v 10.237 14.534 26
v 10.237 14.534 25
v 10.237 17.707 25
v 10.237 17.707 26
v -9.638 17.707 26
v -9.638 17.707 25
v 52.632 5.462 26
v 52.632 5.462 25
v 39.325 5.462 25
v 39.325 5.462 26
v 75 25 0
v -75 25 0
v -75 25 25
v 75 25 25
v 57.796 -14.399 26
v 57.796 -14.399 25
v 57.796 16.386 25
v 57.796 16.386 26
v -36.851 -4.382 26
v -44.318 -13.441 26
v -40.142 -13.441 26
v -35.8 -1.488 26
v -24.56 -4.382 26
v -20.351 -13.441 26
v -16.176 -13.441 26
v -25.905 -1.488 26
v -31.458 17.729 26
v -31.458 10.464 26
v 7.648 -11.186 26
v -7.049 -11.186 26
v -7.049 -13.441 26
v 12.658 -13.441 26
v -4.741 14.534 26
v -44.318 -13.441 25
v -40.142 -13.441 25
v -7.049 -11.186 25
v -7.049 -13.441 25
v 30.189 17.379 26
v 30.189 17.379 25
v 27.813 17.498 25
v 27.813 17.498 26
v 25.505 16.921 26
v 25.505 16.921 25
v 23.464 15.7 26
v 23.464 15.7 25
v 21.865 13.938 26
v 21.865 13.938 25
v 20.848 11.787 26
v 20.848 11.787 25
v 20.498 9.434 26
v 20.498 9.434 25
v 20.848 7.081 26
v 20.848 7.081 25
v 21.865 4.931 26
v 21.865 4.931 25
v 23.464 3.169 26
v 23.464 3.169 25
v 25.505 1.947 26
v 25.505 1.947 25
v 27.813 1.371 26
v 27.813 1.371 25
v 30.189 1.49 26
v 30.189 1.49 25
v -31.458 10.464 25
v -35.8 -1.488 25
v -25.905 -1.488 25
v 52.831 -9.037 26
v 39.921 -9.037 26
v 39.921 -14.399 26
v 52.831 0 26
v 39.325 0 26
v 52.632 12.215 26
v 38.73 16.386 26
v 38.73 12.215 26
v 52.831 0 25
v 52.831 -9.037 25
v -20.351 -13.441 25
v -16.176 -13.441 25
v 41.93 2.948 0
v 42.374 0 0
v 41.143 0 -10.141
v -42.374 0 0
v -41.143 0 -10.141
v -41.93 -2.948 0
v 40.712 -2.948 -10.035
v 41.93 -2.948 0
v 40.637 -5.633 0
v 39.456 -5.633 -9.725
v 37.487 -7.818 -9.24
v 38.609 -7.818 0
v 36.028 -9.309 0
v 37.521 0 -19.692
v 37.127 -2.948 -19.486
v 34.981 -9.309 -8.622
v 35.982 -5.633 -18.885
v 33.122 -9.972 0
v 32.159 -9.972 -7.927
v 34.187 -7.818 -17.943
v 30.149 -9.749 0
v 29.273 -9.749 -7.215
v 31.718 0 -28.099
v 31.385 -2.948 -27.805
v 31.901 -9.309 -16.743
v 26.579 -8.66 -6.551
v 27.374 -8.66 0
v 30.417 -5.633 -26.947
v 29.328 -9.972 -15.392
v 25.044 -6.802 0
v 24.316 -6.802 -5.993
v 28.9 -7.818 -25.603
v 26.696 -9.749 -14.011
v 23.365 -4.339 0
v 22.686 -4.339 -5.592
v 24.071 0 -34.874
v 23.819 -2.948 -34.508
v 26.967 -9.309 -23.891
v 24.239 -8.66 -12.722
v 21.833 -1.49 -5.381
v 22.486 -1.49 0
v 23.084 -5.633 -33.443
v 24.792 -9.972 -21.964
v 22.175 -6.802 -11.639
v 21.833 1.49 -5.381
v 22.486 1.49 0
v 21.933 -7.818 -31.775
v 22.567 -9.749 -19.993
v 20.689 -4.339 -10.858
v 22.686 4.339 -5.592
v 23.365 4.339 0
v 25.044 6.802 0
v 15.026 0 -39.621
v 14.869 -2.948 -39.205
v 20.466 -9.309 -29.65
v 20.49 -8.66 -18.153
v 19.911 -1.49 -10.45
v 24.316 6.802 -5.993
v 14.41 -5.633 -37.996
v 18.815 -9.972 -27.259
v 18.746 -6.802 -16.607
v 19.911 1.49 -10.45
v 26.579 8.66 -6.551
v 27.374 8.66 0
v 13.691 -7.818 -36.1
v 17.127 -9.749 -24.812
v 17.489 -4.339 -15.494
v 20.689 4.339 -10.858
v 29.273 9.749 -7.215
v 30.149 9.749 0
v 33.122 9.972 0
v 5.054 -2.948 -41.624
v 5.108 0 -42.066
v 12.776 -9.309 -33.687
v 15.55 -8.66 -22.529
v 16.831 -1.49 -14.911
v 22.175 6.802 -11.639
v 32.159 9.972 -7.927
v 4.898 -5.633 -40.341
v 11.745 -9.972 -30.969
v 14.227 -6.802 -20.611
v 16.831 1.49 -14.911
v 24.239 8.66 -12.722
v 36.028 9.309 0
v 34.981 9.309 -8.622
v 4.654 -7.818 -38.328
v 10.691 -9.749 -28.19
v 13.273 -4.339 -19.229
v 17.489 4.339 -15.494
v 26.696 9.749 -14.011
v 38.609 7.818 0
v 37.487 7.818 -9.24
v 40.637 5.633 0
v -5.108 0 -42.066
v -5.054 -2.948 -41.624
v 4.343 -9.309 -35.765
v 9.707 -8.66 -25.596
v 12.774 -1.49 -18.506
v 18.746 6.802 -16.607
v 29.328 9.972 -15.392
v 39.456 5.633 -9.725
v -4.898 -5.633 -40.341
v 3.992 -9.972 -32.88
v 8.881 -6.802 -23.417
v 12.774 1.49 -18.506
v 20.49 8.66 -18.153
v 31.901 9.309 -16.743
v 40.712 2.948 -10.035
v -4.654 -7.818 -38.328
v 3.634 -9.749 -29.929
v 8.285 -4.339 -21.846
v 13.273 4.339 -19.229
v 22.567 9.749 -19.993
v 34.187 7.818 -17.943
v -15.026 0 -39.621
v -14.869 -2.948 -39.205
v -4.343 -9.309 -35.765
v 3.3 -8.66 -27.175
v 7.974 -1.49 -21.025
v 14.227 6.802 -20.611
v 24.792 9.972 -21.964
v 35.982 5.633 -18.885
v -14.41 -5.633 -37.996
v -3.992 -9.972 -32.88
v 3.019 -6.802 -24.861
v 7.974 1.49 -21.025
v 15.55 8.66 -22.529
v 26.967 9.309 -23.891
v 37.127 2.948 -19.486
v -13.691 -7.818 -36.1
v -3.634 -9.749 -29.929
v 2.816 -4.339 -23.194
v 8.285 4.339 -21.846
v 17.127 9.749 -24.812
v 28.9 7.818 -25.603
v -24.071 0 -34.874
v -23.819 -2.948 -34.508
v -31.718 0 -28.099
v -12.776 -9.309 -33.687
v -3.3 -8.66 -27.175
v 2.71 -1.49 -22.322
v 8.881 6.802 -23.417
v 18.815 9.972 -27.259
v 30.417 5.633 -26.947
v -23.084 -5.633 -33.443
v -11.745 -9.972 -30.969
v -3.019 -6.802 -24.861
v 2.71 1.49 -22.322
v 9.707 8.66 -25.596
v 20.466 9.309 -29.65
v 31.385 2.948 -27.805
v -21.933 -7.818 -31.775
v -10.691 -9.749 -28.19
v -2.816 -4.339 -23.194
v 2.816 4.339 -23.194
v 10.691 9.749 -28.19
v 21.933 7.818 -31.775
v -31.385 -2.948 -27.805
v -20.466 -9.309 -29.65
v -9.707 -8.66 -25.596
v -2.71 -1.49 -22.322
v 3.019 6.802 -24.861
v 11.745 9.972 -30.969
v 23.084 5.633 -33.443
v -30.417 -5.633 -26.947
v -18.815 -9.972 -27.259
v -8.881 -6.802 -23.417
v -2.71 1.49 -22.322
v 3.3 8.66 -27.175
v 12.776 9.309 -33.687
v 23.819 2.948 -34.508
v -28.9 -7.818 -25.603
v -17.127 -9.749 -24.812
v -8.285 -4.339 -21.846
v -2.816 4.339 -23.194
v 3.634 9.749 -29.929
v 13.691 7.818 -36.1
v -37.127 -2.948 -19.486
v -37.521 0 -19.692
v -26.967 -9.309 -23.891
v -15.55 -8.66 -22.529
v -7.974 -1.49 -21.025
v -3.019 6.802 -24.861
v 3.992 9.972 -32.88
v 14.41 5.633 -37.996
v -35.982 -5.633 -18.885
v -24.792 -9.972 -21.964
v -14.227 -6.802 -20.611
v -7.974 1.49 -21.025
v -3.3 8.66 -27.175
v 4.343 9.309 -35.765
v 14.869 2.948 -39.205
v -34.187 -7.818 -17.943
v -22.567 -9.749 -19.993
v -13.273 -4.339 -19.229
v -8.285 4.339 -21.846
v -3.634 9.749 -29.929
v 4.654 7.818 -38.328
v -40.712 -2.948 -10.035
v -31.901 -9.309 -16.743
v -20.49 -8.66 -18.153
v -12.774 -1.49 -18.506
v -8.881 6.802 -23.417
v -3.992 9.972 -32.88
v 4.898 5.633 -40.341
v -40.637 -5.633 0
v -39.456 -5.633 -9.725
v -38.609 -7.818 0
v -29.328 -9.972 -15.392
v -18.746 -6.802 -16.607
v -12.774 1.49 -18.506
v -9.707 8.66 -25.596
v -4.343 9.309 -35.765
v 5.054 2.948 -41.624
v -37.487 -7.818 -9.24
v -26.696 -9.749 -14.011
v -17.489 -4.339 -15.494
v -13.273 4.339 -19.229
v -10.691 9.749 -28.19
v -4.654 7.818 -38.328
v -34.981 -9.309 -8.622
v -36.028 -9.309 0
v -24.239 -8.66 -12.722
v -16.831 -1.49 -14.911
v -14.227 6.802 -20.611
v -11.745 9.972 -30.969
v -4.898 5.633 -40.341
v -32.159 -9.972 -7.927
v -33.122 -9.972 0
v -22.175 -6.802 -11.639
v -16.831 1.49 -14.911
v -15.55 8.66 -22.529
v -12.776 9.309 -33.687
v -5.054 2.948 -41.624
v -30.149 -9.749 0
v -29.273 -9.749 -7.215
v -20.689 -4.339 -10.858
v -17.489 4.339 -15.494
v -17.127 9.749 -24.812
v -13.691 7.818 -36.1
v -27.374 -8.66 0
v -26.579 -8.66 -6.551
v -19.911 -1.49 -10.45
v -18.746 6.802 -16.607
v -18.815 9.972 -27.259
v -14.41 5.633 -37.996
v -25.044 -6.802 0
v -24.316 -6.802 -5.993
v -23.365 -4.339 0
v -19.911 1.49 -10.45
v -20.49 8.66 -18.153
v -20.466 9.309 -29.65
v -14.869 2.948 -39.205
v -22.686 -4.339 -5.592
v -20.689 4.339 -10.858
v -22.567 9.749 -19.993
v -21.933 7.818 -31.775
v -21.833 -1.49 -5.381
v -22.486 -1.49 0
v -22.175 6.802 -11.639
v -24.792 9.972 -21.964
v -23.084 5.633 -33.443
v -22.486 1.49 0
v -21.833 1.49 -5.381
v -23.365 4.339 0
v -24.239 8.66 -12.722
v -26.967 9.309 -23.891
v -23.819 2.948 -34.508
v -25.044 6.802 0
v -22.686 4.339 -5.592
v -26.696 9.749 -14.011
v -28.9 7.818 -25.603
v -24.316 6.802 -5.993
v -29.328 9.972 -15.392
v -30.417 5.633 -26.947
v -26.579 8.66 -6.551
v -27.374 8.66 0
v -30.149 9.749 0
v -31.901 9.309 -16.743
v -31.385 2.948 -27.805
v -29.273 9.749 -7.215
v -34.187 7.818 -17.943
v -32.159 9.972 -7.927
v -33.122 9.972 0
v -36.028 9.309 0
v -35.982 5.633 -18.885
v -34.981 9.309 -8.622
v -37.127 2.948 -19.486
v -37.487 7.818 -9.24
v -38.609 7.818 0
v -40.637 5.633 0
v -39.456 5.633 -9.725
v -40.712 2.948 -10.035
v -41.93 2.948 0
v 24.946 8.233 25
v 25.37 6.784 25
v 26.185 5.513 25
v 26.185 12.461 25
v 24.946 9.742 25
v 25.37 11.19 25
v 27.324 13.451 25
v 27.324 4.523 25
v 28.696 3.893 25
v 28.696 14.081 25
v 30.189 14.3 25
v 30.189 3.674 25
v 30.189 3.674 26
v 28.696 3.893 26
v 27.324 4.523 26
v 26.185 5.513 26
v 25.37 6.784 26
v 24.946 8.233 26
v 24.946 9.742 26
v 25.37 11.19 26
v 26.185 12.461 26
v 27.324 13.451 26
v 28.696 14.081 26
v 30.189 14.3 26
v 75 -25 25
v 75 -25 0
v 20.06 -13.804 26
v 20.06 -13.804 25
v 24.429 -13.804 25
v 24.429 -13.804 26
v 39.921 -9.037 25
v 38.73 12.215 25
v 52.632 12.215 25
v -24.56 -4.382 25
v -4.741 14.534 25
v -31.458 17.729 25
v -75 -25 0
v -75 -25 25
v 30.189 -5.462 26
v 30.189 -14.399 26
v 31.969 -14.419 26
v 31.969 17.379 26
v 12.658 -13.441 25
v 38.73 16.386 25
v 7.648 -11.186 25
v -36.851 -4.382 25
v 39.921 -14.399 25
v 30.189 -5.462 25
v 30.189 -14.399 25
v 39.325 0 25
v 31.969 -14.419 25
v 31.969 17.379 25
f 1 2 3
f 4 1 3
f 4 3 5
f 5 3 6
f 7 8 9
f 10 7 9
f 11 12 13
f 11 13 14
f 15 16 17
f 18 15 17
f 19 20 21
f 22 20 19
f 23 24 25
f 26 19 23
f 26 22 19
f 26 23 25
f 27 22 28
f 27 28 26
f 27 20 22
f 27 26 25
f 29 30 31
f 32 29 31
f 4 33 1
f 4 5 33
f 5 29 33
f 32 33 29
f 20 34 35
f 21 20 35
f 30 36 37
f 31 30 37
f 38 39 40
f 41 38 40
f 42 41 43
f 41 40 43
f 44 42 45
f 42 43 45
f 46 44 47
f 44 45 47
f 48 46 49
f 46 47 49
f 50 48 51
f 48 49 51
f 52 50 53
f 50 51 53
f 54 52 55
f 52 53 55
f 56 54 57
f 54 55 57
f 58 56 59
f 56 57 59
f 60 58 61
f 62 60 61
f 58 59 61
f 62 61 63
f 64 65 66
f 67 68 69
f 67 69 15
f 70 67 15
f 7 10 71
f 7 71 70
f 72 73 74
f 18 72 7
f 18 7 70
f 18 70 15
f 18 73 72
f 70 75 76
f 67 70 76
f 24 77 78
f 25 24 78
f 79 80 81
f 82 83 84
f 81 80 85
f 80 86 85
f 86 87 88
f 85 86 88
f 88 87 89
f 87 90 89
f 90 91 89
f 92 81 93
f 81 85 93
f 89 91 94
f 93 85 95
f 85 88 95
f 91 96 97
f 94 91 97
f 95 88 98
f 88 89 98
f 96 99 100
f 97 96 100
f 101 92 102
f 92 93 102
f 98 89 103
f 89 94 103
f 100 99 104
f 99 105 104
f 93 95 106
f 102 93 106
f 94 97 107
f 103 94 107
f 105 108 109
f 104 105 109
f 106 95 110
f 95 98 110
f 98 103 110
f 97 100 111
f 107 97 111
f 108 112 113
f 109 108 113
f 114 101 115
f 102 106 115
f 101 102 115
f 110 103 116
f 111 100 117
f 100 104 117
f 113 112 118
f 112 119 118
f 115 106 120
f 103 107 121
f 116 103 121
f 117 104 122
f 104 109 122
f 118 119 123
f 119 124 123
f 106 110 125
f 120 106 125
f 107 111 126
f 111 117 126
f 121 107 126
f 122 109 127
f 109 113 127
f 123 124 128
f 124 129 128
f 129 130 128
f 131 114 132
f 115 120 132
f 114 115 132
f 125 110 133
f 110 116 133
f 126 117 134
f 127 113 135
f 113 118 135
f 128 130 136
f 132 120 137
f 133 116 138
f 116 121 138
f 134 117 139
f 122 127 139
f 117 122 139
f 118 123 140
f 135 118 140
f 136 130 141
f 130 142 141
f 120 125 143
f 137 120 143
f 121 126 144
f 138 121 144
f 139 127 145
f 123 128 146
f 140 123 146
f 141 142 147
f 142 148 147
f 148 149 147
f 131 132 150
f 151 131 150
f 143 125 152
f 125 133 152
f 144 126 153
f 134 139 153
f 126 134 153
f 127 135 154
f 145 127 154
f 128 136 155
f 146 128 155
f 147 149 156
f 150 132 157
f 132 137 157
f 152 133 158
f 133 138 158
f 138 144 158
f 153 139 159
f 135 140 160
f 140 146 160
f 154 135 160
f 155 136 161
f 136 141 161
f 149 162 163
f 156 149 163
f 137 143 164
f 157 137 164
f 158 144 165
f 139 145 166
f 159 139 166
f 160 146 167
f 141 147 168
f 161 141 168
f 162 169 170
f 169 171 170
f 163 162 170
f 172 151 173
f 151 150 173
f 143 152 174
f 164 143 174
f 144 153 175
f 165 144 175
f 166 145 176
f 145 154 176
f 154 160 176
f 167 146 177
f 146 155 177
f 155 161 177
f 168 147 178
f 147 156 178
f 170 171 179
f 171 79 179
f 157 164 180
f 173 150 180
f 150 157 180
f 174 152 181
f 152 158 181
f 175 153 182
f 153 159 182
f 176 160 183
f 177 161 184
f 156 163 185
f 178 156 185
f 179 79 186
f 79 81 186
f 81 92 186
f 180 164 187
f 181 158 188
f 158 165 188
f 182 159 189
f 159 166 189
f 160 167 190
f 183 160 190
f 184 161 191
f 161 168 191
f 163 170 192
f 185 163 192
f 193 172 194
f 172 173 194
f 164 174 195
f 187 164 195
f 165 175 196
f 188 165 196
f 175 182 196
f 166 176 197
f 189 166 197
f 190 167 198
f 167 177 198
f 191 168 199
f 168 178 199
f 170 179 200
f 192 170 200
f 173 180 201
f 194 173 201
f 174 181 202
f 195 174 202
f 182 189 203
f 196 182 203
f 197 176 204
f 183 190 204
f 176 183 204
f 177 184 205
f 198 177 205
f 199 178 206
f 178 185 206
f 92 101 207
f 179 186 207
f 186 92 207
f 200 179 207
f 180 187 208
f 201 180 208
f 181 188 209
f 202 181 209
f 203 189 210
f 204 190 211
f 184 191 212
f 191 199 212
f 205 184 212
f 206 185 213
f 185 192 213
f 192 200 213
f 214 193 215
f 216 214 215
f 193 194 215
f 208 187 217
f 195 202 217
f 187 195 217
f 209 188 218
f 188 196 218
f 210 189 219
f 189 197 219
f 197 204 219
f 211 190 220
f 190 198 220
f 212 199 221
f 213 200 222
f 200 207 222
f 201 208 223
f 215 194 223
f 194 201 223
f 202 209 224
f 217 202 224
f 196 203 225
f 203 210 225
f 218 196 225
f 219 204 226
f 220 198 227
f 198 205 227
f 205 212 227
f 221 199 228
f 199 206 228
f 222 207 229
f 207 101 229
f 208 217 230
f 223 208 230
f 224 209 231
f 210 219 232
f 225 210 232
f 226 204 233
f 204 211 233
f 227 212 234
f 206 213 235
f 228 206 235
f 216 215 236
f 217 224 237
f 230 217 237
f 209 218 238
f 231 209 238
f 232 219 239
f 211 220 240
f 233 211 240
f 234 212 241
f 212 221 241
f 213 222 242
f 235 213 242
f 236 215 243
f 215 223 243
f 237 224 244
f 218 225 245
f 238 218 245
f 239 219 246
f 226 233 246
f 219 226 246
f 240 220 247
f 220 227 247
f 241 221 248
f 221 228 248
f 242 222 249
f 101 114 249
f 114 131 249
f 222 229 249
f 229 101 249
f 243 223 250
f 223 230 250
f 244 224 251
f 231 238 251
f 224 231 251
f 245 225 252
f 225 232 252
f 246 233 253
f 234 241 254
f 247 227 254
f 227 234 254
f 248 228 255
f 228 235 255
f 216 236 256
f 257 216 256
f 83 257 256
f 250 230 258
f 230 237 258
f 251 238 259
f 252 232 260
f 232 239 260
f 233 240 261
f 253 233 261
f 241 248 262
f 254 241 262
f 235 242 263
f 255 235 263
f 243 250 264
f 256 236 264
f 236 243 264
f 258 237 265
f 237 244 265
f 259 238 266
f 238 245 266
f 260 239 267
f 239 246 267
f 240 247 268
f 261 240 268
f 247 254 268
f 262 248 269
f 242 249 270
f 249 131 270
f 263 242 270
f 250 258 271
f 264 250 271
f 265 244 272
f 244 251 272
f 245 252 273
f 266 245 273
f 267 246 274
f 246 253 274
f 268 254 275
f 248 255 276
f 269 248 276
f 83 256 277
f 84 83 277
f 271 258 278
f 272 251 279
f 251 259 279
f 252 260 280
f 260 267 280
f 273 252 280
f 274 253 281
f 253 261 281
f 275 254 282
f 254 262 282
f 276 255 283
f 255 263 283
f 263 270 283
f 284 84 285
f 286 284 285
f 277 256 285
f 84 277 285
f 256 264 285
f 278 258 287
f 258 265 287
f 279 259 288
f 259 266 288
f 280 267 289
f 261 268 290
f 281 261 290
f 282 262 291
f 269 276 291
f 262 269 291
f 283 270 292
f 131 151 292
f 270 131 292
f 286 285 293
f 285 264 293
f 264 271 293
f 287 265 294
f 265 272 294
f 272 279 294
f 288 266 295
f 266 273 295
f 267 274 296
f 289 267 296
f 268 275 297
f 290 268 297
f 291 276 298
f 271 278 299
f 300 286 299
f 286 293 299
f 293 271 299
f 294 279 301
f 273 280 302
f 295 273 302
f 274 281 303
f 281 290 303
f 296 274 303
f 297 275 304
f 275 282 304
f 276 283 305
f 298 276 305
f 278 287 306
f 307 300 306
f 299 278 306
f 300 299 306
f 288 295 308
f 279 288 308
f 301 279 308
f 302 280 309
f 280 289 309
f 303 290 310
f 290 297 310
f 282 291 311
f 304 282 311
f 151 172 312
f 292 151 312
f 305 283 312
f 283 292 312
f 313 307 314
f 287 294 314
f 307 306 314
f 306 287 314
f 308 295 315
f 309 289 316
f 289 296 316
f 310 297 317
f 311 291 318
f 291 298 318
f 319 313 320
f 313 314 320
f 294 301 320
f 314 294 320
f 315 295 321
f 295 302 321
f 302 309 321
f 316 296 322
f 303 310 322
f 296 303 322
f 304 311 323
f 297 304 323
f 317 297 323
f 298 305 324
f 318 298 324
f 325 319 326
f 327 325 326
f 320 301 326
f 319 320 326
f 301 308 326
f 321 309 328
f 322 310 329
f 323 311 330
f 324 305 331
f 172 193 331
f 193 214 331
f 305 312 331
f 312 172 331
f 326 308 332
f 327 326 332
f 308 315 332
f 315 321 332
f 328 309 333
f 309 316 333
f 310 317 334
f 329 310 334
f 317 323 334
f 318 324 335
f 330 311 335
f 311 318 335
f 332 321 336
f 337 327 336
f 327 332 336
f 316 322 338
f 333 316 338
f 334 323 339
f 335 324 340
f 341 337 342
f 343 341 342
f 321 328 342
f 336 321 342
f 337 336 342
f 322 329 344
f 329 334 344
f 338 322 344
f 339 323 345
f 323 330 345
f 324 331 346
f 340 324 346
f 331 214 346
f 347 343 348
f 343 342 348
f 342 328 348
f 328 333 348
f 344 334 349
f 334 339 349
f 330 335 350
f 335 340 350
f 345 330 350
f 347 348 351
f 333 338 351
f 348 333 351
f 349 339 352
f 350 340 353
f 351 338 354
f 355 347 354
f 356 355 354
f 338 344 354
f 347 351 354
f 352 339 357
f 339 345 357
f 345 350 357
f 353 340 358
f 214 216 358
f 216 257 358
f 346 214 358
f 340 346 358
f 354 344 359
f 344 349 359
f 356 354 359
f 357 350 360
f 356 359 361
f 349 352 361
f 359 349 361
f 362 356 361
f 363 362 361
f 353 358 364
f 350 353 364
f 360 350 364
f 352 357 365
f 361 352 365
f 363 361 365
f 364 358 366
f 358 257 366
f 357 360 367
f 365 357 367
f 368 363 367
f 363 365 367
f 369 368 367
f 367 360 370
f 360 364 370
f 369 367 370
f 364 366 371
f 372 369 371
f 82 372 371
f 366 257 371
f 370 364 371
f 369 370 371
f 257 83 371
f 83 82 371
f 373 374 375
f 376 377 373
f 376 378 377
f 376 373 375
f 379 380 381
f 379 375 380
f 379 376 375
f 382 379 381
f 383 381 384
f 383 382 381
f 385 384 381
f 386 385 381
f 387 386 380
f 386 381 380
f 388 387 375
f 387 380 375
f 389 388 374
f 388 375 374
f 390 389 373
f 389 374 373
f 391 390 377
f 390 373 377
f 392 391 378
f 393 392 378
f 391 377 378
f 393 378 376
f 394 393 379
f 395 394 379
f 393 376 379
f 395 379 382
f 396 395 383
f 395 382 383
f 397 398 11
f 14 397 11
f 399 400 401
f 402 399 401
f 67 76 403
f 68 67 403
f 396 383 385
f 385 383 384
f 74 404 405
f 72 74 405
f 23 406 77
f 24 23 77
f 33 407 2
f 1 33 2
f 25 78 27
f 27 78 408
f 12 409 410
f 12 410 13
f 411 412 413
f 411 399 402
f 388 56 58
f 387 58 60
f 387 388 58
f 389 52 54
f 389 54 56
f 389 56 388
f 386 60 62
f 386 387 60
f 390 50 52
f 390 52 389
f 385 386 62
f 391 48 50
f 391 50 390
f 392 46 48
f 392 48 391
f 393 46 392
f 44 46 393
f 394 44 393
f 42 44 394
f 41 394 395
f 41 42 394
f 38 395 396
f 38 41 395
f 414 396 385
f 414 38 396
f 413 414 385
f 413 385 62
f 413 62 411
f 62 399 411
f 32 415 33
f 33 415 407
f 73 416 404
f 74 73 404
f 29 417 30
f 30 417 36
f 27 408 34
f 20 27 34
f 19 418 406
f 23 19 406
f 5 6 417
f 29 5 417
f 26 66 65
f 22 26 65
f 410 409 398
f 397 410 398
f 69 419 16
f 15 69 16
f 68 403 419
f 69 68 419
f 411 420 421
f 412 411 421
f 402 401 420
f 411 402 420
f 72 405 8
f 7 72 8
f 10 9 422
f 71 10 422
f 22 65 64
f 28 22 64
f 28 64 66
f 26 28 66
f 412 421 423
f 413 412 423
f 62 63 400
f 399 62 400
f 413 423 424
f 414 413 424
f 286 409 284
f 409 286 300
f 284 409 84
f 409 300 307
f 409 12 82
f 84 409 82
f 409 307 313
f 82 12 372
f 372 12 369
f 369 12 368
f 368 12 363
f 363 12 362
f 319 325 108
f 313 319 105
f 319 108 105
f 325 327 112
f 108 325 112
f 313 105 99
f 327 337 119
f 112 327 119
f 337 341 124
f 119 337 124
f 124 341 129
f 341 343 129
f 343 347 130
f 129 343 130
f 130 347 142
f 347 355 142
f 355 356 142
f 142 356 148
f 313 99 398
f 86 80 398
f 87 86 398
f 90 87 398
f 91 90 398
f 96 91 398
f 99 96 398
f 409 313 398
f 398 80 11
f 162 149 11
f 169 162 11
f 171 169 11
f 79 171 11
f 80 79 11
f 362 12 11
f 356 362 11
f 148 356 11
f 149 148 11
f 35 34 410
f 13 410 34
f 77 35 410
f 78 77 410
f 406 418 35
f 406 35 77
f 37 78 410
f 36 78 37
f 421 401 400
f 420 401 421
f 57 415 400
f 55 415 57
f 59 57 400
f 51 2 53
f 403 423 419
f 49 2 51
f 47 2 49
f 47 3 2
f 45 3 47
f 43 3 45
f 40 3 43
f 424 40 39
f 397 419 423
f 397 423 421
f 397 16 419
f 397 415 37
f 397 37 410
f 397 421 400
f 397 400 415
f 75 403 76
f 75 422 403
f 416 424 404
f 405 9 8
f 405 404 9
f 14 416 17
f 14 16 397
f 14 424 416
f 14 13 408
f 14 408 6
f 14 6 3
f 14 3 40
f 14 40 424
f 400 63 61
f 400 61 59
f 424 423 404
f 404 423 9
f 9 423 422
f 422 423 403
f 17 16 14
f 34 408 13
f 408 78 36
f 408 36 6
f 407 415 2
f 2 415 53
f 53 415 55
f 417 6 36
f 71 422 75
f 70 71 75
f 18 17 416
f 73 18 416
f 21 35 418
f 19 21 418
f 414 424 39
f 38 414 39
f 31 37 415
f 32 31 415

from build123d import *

# Parameters (mm, degrees)
F0_W     = 150
F0_H     = 50
F1_DEPTH = 25
F3_DEPTH = 1
F4_R     = 10
F5_ANGLE = -180


with BuildPart() as f1:
    # F0 (on Top) → F1 (new body)
    with BuildSketch(Plane.XY):
        Rectangle(F0_W, F0_H)
    extrude(amount=F1_DEPTH)

    # F2 (on face) → F3 (join)
    with BuildSketch(Plane.XY.offset(25)):
        Polygon((-20.35143, -13.440839), (-16.17611, -13.440839), (-31.457786, 17.728945), (-44.317774, -13.440839), (-40.142454, -13.440839), (-36.851476, -4.382354), (-24.560086, -4.382354), align=None)
        Polygon((-35.80012, -1.488477), (-31.457786, 10.463886), (-25.904608, -1.488477), align=None, mode=Mode.SUBTRACT)
        Polygon((10.236647, 14.533813), (10.236647, 17.707057), (-6.715158, 17.707057), (-9.637882, 17.707057), (7.647947, -11.186166), (-7.049183, -11.186166), (-7.049183, -13.440839), (12.658333, -13.440839), (-4.741451, 14.533813), align=None)
        with BuildLine():
            Line((30.189158, -5.461854), (30.189158, -14.399434))
            Line((30.189158, -14.399434), (31.969018, -14.419133))
            Line((31.969018, -14.419133), (31.969018, 17.378626))
            Line((31.969018, 17.378626), (30.189158, 17.378626))
            ThreePointArc((30.189158, 17.378626), (20.49841, 9.434111), (30.189158, 1.489596))
            Line((30.189158, 1.489596), (20.0599, -13.803595))
            Line((20.0599, -13.803595), (24.429381, -13.803595))
            Line((24.429381, -13.803595), (30.189158, -5.461854))
        make_face()
        with BuildLine():
            ThreePointArc((30.189158, 3.674338), (24.891917, 8.987233), (30.189158, 14.300127))
            Line((30.189158, 14.300127), (30.189158, 3.674338))
        make_face(mode=Mode.SUBTRACT)
        Polygon((57.79634, 16.385563), (38.729511, 16.385563), (38.729511, 12.214691), (52.63241, 12.214691), (52.63241, 5.461854), (39.325345, 5.461854), (39.325345, 0), (52.83102, 0), (52.83102, -9.036886), (39.921183, -9.036886), (39.921183, -14.399434), (57.79634, -14.399434), align=None)
    extrude(amount=F3_DEPTH)

    # F4 (on face) → F5 (revolve)
    with BuildSketch(Plane(origin=(0, 0, 0), x_dir=(1, 0, 0), z_dir=(0, 0, -1))):
        with Locations((32.374486, 0)):
            Circle(F4_R)
    revolve(axis=Axis((0, -0.202699, 0), (0, -1, 0)), revolution_arc=F5_ANGLE)


solid = f1.part
